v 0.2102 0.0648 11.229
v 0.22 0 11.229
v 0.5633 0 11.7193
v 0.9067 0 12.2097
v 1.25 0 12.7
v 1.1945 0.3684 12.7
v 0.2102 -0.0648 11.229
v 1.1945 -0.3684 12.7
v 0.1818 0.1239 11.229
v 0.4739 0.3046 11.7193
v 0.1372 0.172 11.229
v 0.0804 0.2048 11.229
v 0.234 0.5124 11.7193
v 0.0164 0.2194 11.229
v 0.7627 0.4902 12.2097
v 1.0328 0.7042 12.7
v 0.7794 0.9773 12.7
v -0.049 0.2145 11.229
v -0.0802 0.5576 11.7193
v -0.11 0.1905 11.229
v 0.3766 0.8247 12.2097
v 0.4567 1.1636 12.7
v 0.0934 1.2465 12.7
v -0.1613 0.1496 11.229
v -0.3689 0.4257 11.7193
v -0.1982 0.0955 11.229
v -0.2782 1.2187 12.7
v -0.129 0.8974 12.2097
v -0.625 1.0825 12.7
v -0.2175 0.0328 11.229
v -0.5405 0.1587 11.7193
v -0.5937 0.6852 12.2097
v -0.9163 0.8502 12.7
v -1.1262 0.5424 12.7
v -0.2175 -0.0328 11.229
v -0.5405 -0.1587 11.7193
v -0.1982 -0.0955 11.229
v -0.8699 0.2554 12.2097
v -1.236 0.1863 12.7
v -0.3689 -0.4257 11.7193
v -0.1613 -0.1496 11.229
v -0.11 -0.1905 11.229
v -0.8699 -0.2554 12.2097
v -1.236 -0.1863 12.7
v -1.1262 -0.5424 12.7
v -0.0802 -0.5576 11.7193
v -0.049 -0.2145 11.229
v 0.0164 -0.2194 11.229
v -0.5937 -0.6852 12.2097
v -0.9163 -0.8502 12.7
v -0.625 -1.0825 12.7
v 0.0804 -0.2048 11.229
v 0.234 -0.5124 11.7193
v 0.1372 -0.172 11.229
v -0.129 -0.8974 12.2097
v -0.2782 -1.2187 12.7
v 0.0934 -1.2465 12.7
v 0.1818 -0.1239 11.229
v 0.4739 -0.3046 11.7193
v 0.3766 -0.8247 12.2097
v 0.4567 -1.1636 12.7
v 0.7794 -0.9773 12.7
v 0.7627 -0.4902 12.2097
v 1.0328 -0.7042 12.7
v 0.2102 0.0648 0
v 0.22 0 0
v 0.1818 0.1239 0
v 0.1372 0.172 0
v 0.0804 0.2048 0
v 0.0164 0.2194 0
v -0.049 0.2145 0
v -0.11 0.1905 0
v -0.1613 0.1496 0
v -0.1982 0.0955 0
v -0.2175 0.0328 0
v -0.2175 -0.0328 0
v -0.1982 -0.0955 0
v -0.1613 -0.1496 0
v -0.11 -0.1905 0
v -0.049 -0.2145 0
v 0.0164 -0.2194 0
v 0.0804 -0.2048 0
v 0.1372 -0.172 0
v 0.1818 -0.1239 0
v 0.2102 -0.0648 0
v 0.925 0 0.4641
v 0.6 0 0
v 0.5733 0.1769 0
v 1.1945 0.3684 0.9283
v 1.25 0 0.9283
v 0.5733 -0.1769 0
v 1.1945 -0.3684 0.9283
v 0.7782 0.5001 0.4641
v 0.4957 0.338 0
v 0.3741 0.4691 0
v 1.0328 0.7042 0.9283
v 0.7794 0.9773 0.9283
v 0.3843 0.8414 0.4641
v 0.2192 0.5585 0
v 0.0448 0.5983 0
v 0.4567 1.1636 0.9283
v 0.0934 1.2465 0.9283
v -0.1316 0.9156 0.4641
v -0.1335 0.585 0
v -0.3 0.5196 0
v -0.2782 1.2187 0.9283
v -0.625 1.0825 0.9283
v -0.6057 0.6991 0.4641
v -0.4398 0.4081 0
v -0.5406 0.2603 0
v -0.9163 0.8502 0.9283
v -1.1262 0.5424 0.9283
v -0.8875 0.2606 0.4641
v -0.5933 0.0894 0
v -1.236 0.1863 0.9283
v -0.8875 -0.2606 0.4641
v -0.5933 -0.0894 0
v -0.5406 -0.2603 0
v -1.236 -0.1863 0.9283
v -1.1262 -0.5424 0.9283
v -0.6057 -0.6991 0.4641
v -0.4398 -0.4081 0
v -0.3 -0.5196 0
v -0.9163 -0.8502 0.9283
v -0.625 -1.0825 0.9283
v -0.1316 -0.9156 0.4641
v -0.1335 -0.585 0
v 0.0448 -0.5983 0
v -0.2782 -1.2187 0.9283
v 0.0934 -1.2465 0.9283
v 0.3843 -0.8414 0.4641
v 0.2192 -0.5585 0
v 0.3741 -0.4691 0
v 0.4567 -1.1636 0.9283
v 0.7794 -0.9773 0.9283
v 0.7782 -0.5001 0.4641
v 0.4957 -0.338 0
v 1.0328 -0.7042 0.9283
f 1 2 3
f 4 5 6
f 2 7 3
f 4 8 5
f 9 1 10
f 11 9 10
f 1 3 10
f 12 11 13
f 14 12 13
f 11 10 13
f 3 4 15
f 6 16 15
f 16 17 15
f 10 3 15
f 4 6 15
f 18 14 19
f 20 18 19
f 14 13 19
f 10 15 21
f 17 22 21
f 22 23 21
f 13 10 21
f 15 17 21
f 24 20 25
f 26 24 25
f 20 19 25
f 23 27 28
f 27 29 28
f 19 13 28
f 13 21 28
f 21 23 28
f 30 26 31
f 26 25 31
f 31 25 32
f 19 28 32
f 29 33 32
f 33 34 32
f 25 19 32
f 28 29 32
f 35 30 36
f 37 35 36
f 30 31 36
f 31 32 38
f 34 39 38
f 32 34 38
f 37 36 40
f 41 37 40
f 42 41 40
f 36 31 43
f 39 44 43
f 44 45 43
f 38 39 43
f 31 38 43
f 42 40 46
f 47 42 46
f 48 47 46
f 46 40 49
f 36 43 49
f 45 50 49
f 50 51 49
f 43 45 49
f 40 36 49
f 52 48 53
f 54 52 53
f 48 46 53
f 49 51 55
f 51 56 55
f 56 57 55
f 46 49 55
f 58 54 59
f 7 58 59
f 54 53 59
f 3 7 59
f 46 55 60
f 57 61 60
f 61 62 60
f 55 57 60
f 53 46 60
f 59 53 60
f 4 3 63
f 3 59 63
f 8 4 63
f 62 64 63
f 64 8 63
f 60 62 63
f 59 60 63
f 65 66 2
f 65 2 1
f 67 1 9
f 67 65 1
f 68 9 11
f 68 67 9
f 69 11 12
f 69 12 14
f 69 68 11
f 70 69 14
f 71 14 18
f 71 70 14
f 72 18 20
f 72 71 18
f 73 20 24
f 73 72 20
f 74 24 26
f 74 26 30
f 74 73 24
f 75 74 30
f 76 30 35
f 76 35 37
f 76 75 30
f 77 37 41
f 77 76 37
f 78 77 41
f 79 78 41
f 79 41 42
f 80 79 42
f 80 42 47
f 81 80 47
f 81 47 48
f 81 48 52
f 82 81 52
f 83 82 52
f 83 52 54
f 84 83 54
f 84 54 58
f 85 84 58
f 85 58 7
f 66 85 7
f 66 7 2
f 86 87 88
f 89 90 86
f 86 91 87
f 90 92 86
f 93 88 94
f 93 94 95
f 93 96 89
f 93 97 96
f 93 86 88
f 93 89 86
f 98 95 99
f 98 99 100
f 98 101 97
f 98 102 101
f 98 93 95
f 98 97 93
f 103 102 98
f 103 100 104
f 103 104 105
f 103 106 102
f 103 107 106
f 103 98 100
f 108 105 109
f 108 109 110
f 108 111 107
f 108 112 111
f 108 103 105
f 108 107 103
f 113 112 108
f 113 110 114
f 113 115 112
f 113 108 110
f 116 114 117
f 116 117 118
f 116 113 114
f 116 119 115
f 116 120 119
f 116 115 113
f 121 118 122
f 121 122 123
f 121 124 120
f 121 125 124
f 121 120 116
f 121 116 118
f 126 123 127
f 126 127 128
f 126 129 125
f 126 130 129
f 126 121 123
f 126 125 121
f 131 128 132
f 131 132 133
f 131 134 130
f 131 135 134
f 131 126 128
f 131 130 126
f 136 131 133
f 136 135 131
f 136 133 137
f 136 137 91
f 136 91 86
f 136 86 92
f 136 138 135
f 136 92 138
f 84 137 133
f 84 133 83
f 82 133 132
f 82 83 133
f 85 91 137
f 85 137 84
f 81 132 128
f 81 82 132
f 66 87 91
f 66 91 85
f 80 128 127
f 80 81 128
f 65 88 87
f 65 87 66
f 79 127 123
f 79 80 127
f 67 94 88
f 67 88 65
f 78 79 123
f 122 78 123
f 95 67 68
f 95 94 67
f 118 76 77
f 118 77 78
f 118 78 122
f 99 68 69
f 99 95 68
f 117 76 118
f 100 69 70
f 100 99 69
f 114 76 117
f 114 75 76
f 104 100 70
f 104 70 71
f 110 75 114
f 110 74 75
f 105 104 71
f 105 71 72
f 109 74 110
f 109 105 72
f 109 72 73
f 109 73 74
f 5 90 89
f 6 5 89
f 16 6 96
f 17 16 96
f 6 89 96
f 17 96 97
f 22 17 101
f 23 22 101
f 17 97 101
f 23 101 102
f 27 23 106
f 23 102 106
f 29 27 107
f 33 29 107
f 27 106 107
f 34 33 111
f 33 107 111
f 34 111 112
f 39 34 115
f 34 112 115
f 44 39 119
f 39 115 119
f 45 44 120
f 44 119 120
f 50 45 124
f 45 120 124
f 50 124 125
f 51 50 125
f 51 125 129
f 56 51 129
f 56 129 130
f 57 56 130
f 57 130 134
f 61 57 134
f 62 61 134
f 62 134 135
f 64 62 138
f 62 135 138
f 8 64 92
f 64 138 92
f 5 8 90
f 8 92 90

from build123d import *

# Parameters (mm, degrees)
CYLINDER001_R     = 0.22
CYLINDER001_DEPTH = 12.7
CYLINDER_R        = 1.25
CYLINDER_DEPTH    = 11.771704


with BuildPart() as cone001:
    # Cone001 → Cone001 (revolve)
    with BuildSketch(Plane(origin=(0, 0, 11.229008), x_dir=(1, 0, 0), z_dir=(0, -1, 0))):
        Polygon((0, 0), (0.22, 0), (1.25, 1.470992), (0, 1.470992), align=None)
    revolve(axis=Axis((0, 0, 11.229008), (0, 0, 1)))


with BuildPart() as fusion001:
    # Cylinder001 → Cylinder001 (new body)
    with BuildSketch(Plane.XY):
        Circle(CYLINDER001_R)
    extrude(amount=CYLINDER001_DEPTH)

    # Fusion001: union Cone001
    add(cone001.part)


with BuildPart() as cone:
    # Cone → Cone (revolve)
    with BuildSketch(Plane.XZ):
        Polygon((0, 0), (0.6, 0), (1.25, 0.928296), (0, 0.928296), align=None)
    revolve(axis=Axis((0, 0, 0), (0, 0, 1)))


with BuildPart() as fiberferrule:
    # Cylinder → Cylinder (new body)
    with BuildSketch(Plane.XY.offset(0.928296)):
        Circle(CYLINDER_R)
    extrude(amount=CYLINDER_DEPTH)

    # Fusion: union Cone
    add(cone.part)

    # Cut: cut Fusion001
    add(fusion001.part, mode=Mode.SUBTRACT)


solid = fiberferrule.part
